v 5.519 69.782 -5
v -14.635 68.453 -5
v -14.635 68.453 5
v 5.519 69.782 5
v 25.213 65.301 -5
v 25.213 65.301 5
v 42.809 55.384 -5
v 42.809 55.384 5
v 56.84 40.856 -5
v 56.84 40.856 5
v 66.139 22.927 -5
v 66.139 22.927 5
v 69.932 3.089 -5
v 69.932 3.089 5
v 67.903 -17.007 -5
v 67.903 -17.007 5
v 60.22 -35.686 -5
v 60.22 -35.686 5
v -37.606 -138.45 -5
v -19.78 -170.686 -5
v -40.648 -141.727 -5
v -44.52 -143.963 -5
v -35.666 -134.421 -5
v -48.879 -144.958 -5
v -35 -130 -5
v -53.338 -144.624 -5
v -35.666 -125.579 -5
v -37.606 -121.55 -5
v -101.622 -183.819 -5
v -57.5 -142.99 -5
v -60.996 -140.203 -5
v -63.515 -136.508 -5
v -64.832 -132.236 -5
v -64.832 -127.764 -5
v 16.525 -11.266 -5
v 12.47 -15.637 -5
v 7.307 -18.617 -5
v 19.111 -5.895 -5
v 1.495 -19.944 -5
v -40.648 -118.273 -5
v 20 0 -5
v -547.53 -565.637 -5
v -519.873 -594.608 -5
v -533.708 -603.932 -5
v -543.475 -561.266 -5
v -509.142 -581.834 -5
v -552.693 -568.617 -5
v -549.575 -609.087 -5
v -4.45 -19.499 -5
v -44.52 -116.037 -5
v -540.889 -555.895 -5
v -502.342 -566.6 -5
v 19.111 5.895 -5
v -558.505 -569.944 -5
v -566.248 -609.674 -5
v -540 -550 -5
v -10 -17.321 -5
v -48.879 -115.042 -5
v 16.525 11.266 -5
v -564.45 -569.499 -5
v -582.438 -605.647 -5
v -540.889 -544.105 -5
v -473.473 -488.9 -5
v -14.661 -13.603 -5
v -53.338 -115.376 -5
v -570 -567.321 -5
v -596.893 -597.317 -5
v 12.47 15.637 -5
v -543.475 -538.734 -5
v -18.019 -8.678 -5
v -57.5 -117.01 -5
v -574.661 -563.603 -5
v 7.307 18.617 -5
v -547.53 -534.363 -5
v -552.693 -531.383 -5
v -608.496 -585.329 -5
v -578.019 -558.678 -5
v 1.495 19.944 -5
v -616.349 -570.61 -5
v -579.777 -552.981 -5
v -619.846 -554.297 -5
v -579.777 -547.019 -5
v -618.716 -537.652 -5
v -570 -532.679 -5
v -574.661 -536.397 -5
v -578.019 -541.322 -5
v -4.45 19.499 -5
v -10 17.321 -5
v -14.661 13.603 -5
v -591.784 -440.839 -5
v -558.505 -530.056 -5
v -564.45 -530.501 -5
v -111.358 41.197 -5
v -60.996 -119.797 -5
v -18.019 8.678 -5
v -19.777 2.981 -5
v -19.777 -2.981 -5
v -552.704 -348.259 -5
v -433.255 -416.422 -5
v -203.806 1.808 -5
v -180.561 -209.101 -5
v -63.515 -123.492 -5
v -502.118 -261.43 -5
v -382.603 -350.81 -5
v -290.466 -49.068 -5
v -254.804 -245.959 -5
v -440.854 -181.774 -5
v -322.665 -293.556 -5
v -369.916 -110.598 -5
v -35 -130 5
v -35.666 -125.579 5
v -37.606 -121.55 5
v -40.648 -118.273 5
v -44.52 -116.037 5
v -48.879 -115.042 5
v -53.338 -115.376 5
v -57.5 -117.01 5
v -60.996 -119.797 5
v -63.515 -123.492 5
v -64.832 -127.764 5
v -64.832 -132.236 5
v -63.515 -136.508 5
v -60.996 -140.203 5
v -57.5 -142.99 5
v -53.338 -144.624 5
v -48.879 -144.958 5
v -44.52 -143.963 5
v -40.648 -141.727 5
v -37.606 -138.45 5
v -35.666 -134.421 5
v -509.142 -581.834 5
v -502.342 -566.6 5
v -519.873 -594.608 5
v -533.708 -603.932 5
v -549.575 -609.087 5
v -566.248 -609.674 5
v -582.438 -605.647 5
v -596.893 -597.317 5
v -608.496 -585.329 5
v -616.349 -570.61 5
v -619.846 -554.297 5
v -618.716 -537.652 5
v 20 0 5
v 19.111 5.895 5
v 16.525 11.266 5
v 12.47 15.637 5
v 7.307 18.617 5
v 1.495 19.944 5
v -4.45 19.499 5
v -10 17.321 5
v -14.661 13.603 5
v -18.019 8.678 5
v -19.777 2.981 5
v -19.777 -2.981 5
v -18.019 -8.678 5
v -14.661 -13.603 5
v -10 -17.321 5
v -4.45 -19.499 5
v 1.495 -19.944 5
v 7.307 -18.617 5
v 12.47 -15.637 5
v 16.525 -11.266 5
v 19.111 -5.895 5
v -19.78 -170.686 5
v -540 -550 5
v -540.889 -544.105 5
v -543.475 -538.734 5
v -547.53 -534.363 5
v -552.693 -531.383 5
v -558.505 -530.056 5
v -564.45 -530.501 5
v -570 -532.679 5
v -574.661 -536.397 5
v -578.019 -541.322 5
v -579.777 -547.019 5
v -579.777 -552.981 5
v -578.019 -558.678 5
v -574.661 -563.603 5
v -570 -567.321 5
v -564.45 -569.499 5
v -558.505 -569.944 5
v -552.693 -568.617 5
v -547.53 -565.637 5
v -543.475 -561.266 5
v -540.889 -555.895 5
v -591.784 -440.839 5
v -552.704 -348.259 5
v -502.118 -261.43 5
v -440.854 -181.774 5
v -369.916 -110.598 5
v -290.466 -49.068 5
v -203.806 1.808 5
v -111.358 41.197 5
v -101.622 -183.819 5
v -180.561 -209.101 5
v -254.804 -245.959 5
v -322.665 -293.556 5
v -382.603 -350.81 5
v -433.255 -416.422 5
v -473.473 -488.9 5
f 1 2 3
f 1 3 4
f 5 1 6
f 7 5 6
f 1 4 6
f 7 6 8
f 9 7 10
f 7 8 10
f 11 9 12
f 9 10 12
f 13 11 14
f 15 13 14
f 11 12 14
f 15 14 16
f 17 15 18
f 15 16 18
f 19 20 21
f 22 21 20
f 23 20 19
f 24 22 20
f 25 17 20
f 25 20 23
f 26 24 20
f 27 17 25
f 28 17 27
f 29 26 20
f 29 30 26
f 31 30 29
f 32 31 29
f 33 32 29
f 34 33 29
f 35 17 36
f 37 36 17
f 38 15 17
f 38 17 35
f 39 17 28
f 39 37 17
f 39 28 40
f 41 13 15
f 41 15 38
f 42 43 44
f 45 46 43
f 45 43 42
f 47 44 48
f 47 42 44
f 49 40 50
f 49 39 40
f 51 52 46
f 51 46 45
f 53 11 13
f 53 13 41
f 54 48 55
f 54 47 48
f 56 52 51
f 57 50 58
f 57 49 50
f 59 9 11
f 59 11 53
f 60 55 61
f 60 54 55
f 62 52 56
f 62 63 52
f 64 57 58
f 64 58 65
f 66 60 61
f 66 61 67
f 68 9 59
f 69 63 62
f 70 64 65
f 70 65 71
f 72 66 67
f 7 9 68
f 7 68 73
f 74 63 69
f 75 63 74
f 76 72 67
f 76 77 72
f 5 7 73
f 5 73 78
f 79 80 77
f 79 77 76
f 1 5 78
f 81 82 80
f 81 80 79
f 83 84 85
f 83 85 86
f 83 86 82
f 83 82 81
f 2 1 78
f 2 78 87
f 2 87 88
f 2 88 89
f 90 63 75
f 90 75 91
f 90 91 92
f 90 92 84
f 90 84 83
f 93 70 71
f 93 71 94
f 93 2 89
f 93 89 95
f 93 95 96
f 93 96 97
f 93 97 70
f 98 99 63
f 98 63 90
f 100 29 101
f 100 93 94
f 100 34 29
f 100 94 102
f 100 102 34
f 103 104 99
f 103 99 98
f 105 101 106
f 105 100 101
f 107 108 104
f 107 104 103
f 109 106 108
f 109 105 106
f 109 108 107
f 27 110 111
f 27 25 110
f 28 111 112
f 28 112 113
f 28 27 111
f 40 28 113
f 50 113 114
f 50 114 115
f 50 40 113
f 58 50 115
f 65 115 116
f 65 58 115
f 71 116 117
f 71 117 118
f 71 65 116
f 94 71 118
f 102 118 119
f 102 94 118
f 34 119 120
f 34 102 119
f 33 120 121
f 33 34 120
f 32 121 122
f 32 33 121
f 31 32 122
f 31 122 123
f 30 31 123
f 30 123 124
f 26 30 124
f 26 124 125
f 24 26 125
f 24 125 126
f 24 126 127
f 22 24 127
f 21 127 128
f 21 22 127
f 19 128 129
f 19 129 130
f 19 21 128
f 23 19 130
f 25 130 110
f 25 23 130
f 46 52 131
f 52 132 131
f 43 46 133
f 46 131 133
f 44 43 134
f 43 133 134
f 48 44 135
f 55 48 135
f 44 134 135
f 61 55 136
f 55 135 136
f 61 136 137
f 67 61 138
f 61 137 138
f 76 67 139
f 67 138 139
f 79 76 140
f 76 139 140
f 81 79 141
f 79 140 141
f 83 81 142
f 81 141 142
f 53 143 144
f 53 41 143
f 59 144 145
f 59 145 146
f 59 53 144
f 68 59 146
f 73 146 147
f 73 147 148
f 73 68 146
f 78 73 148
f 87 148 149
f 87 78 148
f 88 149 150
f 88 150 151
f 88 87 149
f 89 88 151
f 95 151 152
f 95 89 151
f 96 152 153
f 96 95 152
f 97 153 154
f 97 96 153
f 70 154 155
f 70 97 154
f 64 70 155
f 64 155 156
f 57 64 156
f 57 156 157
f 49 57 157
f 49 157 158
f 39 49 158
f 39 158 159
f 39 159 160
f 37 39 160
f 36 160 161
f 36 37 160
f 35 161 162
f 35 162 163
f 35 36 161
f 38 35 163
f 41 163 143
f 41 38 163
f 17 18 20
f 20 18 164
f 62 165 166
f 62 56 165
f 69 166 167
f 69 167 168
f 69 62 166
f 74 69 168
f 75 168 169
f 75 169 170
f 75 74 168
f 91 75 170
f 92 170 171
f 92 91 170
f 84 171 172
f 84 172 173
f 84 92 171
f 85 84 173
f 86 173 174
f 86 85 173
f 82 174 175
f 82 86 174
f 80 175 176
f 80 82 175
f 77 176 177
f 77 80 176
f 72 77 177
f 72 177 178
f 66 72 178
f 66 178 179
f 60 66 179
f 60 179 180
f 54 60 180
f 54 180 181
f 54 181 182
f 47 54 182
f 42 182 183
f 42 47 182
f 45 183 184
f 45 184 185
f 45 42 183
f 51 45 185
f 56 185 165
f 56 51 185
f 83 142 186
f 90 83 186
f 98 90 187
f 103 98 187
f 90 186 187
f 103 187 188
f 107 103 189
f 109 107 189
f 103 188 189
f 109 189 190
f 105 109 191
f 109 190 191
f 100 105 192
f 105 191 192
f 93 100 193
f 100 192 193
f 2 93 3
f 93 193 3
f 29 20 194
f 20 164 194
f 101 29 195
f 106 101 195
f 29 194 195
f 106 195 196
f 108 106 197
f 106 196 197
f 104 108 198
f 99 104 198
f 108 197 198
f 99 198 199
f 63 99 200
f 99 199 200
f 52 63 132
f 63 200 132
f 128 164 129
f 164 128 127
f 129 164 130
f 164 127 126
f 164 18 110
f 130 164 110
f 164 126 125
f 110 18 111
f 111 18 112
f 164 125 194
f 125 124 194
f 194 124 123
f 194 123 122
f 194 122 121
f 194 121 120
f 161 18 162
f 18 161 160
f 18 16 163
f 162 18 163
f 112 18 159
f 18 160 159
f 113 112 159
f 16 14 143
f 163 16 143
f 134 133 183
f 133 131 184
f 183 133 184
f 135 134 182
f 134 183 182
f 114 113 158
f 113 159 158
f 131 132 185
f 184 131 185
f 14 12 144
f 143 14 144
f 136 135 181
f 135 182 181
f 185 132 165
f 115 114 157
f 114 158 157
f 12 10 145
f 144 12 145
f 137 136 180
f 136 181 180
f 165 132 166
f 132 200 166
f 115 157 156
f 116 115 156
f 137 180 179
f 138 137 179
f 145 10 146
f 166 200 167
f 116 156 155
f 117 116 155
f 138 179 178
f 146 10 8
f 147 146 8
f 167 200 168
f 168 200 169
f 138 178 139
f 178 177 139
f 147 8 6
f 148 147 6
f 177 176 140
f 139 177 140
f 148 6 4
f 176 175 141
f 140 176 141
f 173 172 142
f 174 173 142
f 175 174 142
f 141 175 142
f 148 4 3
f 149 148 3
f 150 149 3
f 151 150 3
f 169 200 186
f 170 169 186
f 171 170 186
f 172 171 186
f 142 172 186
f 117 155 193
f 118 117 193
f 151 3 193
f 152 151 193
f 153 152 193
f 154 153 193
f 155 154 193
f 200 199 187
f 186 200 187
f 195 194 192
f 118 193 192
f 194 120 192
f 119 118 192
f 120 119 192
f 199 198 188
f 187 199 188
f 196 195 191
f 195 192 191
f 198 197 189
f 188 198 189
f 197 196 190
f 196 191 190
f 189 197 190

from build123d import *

# Parameters (mm, degrees)
SKETCH1_R           = 20
SKETCH1_R_2         = 15
BOSS_EXTRUDE1_DEPTH = 5


with BuildPart() as part:
    # Sketch1 → Boss-Extrude1 (new body, symmetric)
    with BuildSketch(Plane.XY):
        with BuildLine():
            Line((60.220407354, -35.686167321), (-19.779592646, -170.686167321))
            ThreePointArc((-19.779592646, -170.686167321), (-322.664914871, -293.556077803), (-502.341900983, -566.599506551))
            ThreePointArc((-502.341900983, -566.599506551), (-574.483190404, -608.225743411), (-618.715737076, -537.652440745))
            ThreePointArc((-618.715737076, -537.652440745), (-406.524759245, -145.05016338), (-14.634584071, 68.45311497))
            ThreePointArc((-14.634584071, 68.45311497), (56.839813073, 40.856280421), (60.220407354, -35.686167321))
        make_face()
        Circle(SKETCH1_R, mode=Mode.SUBTRACT)
        with Locations((-50, -130)):
            Circle(SKETCH1_R_2, mode=Mode.SUBTRACT)
        with Locations((-560, -550)):
            Circle(SKETCH1_R, mode=Mode.SUBTRACT)
    extrude(amount=BOSS_EXTRUDE1_DEPTH, both=True)


solid = part.part
